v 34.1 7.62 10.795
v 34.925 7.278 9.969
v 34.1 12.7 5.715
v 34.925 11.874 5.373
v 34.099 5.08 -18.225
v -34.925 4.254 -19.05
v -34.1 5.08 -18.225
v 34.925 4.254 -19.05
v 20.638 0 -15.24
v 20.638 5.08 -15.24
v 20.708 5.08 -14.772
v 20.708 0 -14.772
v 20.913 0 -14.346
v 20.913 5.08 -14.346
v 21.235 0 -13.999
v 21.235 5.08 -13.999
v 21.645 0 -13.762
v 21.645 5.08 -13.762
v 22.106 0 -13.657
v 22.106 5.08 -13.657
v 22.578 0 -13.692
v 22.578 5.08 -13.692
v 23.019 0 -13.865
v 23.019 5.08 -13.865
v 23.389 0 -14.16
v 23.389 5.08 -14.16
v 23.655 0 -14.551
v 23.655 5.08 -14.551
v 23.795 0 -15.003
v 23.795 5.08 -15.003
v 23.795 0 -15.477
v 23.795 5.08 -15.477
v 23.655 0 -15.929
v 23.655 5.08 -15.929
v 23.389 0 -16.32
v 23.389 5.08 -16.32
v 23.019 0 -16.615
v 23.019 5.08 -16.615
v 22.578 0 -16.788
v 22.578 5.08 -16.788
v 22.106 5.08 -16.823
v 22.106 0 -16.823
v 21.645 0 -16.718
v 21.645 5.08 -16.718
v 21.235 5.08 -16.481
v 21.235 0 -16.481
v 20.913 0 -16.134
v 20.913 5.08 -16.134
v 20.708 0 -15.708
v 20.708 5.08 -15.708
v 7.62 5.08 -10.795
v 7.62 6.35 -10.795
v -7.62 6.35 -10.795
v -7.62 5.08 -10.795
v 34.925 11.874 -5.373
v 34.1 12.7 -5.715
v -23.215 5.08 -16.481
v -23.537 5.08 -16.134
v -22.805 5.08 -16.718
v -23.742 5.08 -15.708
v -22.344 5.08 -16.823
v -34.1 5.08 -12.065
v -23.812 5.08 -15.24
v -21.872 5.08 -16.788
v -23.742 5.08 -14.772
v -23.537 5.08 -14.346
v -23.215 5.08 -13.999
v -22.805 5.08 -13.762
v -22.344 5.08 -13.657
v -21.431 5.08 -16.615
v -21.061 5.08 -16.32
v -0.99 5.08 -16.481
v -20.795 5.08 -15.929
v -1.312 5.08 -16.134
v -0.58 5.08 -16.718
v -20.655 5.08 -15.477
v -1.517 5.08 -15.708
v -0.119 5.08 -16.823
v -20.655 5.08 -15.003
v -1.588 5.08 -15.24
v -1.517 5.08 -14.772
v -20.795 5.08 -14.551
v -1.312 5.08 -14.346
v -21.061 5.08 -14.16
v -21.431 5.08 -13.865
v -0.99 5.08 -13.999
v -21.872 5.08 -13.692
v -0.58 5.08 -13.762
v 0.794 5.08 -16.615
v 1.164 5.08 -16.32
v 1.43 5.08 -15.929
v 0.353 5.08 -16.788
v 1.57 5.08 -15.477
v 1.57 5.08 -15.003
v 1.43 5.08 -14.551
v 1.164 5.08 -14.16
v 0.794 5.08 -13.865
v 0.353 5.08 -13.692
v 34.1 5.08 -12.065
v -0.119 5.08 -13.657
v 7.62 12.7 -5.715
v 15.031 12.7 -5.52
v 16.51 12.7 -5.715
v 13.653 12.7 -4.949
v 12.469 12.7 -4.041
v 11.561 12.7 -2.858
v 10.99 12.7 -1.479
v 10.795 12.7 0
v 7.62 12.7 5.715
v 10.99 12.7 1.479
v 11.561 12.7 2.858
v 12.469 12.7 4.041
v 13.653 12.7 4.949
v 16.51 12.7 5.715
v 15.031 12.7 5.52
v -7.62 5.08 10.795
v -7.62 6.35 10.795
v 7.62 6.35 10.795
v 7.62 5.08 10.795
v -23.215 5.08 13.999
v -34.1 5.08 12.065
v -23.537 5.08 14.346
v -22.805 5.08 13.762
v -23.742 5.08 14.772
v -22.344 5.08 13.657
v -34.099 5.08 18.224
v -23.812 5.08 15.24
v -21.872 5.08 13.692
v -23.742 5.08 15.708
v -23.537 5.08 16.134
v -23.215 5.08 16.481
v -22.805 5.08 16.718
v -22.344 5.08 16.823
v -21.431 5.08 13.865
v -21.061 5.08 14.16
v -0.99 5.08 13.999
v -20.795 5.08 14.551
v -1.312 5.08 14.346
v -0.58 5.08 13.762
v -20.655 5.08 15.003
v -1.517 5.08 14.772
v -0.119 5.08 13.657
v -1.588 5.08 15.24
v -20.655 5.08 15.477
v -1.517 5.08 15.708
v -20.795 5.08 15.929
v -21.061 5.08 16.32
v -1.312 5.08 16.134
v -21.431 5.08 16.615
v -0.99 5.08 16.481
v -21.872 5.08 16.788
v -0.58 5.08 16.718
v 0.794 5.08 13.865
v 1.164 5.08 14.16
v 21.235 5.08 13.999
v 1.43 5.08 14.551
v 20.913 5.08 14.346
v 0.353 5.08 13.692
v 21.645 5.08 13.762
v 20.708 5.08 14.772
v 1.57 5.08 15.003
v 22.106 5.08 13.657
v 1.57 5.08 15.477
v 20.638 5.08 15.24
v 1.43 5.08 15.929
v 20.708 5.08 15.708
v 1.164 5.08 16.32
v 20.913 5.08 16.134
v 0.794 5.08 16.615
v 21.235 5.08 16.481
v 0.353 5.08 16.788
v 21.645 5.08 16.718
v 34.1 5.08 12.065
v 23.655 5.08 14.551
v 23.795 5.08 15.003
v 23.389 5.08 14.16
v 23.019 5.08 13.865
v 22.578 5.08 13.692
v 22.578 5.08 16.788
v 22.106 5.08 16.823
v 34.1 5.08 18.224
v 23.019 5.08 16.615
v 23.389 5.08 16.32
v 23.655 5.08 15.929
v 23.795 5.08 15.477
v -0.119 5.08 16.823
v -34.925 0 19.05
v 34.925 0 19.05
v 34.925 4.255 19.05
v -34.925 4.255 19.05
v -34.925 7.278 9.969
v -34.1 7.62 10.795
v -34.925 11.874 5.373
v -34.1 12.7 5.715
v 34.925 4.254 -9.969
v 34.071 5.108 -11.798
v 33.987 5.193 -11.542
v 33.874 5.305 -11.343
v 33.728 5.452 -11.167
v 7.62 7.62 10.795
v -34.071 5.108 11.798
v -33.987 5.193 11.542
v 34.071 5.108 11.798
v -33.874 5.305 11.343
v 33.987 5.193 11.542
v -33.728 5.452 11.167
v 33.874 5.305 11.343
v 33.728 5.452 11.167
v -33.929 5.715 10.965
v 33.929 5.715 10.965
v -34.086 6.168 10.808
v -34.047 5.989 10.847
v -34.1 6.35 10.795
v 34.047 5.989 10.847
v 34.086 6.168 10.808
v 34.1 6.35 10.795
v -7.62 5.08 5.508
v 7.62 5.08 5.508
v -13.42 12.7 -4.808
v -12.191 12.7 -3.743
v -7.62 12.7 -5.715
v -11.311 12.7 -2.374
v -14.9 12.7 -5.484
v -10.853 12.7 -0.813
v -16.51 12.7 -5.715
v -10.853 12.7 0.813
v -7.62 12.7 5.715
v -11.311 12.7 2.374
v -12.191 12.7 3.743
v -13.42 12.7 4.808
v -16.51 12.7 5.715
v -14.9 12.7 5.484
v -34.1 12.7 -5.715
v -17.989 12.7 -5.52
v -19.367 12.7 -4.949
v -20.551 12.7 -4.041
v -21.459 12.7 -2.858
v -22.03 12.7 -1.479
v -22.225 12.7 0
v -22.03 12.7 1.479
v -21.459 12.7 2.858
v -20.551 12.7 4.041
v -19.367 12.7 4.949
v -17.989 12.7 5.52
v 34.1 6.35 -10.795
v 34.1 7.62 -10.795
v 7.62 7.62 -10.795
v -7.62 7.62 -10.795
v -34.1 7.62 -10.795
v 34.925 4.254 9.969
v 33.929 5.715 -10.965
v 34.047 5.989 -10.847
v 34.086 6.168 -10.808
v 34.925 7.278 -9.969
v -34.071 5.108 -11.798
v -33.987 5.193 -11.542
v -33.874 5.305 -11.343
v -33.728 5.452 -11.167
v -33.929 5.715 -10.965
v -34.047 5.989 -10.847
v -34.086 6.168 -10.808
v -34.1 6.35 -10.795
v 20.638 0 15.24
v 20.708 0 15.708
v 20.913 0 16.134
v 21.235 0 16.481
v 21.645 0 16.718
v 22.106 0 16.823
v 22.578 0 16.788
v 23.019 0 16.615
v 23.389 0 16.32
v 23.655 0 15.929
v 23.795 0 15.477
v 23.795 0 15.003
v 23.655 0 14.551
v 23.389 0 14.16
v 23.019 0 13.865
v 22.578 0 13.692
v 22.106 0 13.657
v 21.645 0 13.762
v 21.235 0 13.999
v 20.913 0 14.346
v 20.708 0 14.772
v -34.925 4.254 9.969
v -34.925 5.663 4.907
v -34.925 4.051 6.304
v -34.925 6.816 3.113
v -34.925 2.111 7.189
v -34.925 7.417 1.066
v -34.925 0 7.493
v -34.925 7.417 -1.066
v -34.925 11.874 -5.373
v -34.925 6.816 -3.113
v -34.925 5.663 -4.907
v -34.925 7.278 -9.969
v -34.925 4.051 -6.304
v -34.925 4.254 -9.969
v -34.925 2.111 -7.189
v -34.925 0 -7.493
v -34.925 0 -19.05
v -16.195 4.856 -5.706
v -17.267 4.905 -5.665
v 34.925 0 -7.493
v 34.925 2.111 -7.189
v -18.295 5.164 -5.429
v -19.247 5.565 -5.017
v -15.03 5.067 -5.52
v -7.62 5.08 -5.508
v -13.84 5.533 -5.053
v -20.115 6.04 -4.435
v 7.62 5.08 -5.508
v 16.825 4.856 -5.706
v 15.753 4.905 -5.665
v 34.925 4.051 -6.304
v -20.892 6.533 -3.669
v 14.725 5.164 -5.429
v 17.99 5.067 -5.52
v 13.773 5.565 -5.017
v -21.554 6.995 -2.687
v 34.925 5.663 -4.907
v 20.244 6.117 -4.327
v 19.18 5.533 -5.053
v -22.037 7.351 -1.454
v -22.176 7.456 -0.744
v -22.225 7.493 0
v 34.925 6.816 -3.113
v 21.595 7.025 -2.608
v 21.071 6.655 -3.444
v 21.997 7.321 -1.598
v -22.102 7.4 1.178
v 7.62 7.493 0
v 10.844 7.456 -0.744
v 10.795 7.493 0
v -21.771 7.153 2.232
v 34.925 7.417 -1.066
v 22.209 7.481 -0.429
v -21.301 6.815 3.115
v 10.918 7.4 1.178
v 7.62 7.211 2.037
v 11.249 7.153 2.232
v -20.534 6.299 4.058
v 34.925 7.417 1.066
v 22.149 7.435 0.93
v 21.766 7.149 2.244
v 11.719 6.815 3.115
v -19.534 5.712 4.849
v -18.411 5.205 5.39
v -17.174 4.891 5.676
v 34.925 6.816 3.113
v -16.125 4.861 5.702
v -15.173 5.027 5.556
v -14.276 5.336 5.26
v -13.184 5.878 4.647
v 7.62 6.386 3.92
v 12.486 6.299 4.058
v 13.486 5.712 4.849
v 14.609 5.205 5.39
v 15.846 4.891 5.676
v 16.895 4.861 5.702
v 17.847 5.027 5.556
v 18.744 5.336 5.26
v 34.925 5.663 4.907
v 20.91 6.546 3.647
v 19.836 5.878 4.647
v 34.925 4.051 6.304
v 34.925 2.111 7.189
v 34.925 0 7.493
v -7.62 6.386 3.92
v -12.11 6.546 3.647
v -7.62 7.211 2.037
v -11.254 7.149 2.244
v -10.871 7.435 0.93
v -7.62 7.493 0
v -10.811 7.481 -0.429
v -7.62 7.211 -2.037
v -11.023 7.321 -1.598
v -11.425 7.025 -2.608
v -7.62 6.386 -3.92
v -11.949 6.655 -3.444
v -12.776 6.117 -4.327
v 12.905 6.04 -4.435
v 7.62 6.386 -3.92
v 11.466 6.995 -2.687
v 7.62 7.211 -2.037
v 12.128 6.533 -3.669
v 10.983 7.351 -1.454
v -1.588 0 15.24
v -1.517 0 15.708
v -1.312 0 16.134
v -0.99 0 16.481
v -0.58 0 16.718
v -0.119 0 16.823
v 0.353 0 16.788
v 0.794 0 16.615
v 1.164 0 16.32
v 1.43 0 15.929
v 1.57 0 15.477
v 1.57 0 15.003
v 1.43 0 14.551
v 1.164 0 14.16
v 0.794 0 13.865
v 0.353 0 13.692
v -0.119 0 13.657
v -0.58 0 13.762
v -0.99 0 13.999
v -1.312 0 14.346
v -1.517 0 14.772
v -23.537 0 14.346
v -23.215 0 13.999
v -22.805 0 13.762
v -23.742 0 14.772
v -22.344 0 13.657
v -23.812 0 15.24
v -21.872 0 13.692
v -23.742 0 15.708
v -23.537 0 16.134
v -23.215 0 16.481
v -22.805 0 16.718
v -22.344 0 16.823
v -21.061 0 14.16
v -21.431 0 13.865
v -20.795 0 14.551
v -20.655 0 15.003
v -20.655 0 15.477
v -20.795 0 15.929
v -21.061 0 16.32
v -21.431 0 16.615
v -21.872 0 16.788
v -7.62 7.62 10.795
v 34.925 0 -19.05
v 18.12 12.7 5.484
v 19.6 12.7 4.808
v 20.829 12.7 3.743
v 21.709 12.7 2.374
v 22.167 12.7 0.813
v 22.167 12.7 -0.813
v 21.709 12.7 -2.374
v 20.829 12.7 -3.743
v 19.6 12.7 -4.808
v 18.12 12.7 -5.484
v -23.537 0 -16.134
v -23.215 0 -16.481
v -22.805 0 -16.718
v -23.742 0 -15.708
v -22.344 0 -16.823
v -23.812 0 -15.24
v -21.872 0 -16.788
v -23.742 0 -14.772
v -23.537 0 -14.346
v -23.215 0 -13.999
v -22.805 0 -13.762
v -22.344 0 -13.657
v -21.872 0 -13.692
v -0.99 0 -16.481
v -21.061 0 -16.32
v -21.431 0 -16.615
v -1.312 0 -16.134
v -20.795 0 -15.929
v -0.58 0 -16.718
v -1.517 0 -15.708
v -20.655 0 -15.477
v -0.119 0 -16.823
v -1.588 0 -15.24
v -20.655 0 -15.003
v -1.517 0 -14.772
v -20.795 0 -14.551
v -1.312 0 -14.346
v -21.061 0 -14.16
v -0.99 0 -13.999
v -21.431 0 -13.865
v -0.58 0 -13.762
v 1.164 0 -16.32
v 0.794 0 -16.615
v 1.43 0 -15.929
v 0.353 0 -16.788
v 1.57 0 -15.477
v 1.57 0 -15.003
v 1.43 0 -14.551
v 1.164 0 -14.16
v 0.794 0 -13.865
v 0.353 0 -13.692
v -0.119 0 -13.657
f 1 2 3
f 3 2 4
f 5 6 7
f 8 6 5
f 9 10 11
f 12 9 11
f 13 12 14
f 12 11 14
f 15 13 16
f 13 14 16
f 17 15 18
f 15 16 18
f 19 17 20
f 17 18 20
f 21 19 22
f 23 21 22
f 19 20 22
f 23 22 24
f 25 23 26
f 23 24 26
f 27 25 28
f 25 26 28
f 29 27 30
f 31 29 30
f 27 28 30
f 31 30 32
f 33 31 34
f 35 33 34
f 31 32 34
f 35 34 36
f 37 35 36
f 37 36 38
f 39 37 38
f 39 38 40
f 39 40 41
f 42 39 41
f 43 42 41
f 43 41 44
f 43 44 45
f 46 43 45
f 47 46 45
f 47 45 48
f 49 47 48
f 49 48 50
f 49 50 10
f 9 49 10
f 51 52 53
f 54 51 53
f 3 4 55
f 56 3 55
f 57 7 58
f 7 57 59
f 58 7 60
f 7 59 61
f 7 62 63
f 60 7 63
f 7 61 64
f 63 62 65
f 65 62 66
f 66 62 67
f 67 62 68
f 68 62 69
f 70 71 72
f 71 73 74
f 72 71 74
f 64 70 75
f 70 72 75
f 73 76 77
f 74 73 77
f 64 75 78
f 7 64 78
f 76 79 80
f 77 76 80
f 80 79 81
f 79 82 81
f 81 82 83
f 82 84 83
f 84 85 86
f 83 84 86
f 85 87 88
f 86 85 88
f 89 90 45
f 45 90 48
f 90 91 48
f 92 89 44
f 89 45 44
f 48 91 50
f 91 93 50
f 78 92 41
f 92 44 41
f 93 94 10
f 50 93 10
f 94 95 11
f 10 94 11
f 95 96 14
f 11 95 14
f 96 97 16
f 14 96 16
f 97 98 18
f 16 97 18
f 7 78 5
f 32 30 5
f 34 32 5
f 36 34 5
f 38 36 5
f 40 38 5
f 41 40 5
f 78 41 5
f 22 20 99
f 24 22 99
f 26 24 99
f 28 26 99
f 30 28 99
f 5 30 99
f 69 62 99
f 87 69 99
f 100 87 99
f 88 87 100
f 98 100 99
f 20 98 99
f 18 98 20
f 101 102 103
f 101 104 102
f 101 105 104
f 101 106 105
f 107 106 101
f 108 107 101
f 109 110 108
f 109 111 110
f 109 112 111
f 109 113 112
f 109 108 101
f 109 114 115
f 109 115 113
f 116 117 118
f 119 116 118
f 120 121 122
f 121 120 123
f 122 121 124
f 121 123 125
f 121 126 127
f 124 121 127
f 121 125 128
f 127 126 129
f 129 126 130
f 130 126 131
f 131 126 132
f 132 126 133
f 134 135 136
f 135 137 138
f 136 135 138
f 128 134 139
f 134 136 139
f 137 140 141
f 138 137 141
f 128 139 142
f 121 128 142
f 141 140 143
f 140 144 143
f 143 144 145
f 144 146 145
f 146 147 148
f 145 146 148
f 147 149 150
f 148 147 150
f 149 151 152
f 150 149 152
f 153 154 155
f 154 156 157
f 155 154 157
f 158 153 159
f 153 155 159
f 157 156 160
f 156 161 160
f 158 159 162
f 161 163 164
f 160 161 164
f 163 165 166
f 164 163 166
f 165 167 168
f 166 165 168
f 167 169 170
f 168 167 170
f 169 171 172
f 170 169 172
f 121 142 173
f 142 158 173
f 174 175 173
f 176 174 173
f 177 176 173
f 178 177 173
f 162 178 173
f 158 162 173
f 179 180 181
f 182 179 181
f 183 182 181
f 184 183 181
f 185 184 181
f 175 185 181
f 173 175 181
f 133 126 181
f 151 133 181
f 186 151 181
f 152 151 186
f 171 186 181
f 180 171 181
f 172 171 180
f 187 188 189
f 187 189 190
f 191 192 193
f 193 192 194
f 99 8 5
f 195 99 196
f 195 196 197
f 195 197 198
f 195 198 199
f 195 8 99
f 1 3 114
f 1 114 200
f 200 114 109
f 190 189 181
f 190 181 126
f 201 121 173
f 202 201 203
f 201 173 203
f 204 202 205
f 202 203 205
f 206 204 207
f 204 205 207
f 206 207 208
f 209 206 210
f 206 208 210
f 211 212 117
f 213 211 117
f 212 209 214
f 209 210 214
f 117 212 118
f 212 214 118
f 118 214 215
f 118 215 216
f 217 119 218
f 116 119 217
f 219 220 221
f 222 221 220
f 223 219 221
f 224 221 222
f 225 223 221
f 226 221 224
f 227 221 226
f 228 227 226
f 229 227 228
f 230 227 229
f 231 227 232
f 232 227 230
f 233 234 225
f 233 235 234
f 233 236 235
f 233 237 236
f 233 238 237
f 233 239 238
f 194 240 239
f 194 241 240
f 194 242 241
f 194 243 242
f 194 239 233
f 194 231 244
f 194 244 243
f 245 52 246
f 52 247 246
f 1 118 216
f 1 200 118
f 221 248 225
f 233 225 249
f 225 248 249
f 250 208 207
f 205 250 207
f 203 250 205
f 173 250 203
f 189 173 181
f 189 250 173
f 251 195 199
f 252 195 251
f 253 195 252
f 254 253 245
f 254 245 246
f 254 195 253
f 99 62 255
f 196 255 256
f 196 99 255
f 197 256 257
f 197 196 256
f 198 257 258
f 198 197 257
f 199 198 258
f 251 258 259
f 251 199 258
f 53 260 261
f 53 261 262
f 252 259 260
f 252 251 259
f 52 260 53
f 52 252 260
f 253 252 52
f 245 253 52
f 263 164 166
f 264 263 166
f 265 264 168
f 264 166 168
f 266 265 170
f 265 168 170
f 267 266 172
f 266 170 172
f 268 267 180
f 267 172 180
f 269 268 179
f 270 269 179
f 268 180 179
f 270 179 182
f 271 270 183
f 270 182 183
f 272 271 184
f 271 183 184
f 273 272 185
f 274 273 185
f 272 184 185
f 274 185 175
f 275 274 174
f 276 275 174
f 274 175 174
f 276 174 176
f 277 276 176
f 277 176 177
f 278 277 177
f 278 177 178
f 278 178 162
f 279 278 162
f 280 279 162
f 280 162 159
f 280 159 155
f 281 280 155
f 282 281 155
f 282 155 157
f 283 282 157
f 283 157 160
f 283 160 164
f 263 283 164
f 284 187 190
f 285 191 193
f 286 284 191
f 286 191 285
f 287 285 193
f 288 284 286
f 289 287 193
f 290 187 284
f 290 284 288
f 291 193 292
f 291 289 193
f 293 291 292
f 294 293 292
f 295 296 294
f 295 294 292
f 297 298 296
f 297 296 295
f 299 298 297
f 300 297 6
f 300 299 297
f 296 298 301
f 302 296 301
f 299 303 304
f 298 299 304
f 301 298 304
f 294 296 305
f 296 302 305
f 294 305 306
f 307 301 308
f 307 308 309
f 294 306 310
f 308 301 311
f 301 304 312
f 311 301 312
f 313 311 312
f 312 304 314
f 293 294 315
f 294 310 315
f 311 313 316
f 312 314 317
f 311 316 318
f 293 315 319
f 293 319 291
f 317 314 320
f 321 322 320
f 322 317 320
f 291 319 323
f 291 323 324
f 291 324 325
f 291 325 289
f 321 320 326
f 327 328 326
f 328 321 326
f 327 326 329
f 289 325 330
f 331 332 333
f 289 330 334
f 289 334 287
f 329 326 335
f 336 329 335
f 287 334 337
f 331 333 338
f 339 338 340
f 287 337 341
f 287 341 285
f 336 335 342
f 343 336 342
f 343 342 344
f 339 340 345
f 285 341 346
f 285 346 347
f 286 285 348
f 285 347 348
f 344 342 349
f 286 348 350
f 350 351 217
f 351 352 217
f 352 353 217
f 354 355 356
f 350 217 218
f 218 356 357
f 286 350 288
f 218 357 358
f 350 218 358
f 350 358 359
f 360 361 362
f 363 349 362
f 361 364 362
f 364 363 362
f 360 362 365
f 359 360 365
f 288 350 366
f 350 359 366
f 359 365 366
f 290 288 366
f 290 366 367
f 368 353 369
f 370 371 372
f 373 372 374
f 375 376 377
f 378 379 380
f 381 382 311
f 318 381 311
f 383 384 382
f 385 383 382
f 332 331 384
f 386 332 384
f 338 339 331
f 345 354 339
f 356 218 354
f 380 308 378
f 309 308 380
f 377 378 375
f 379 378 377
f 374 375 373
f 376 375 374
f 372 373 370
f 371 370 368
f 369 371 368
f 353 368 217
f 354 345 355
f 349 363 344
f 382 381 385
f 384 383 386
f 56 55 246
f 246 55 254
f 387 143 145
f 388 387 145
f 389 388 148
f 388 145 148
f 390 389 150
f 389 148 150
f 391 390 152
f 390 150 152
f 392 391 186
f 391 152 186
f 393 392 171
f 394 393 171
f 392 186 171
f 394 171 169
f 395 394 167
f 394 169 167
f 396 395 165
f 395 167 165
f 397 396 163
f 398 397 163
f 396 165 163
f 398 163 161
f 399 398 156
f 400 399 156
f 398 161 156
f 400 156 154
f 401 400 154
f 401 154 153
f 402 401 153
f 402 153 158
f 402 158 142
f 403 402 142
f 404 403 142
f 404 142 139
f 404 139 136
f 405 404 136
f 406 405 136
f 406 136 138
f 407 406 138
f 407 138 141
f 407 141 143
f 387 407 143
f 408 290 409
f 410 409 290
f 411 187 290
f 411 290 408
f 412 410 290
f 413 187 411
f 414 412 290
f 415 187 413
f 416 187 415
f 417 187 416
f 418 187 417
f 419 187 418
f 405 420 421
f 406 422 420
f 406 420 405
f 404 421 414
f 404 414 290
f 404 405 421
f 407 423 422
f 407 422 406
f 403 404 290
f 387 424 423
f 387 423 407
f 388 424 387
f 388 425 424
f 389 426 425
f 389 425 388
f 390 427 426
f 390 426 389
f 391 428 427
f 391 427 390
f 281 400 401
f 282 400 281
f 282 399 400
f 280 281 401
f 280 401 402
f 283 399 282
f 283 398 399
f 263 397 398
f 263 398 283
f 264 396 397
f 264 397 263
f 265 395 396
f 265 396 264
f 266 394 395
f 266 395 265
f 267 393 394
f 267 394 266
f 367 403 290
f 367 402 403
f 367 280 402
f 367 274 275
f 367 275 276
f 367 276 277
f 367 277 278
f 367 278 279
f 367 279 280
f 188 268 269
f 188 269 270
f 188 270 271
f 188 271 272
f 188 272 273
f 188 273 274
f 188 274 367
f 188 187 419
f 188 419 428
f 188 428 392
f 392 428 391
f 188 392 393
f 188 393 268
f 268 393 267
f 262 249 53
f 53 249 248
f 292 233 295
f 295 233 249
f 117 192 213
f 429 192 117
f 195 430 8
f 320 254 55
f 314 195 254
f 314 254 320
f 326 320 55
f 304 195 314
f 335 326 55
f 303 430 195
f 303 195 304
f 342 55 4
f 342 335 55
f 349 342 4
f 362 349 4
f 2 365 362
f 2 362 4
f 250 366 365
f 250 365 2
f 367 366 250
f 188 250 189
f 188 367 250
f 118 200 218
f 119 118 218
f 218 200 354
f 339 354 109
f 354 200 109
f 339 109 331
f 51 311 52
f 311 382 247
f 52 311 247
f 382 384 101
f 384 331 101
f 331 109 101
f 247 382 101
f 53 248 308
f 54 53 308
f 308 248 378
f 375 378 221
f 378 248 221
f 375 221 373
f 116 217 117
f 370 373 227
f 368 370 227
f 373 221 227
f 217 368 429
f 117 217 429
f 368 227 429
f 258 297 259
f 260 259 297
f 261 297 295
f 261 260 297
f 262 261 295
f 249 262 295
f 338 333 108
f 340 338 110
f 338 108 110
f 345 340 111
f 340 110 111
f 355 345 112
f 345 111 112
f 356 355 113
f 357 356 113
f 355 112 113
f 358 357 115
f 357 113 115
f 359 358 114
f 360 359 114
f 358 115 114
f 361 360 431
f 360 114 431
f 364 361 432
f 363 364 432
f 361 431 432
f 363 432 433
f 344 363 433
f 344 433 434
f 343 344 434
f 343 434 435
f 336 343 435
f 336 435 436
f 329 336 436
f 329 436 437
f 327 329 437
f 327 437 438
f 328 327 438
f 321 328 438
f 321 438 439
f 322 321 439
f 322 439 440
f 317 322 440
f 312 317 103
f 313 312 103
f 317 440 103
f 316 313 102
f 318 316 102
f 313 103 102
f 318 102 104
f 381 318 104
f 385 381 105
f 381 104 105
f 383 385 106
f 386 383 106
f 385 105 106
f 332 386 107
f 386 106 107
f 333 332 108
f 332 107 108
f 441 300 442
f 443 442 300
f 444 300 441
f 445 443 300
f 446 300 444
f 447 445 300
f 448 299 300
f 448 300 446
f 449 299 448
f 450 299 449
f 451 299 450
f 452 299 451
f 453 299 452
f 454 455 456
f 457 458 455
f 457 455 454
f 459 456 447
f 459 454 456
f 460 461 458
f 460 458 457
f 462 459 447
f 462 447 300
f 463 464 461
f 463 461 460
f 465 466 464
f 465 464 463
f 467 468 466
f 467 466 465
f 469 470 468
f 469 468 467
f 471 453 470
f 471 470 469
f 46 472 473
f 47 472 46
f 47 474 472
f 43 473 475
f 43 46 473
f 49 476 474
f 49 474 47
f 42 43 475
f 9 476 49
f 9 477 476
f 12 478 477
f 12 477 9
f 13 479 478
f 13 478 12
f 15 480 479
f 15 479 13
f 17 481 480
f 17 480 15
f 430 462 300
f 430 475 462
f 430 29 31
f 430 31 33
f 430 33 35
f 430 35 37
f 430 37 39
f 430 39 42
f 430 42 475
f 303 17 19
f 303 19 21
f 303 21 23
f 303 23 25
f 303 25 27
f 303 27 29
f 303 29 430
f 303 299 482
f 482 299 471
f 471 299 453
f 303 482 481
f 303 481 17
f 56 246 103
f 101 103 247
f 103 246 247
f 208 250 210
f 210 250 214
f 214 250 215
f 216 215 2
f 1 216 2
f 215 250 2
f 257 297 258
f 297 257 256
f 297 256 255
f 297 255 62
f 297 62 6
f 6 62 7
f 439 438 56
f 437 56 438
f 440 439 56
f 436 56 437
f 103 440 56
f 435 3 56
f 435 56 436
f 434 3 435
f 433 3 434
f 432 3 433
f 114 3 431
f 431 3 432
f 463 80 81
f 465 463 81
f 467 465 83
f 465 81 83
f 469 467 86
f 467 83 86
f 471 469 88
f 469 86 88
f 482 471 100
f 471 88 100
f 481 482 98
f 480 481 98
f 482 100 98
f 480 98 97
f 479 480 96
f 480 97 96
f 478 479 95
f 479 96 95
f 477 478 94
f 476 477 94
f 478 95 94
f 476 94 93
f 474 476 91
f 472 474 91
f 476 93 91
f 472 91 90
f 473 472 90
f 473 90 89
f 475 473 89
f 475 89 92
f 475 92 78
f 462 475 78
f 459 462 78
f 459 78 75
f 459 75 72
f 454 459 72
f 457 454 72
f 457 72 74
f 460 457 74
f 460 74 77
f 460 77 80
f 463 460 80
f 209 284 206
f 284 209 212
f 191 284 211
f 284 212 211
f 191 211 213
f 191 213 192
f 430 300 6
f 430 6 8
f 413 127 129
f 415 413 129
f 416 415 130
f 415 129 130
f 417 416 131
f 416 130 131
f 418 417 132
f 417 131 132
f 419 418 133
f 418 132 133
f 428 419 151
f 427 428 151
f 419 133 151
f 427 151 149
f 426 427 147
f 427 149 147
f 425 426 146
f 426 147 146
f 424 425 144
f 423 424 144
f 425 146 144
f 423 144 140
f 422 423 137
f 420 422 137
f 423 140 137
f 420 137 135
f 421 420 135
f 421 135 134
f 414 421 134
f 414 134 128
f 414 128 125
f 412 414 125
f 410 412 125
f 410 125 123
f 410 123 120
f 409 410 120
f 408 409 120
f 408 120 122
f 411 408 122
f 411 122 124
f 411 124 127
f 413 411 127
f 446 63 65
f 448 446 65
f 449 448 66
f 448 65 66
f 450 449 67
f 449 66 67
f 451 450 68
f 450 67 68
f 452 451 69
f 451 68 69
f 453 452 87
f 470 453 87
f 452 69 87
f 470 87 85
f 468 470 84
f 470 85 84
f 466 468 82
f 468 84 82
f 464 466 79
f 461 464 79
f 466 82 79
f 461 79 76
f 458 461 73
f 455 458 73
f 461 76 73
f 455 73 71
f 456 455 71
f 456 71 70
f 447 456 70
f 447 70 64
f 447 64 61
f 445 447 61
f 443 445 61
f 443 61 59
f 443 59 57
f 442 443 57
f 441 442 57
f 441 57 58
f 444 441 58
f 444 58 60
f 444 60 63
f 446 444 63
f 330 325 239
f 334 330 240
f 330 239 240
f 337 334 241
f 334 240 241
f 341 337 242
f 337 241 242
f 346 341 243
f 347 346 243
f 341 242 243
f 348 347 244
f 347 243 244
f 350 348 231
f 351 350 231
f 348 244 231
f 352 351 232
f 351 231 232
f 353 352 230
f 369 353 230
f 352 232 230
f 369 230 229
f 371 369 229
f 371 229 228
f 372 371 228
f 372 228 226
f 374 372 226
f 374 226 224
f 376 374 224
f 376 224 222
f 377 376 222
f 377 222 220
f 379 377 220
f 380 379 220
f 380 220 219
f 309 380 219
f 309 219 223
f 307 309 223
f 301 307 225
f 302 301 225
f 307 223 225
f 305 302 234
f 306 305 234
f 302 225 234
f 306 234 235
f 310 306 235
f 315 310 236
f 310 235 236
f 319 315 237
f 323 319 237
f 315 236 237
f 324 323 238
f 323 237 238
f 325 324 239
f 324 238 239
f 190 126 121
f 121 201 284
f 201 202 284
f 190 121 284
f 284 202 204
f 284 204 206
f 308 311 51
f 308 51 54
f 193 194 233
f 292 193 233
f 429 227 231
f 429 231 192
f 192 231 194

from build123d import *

# Parameters (mm, degrees)
F0_W      = 34.925
F0_H      = 12.7
F1_DEPTH  = 10.795
F2_DEPTH  = 10.795
F3_W      = 34.925
F3_H      = 19.05
F4_DEPTH  = 5.08
F5_R      = 7.493
F6_DEPTH  = 101.6
F7_R      = 1.5875
F8_DEPTH  = 25.4
F9_SIZE   = 5.08
F10_SIZE  = 0.8255
F11_R     = 1.27
F12_R     = 5.715
F13_DEPTH = 25.4
F14_W     = 7.62
F14_H     = 5.08
F15_DEPTH = 7.62


with BuildPart() as f1:
    # F0 (on Top) → F1 (new body)
    with BuildSketch(Plane.XY):
        with Locations((-17.4625, 6.35)):
            Rectangle(F0_W, F0_H)
        with Locations((17.4625, 6.35)):
            Rectangle(F0_W, F0_H)
    extrude(amount=F1_DEPTH)

    # F0 (on Top) → F2 (join)
    with BuildSketch(Plane.XY):
        with Locations((-17.4625, 6.35)):
            Rectangle(F0_W, F0_H)
        with Locations((17.4625, 6.35)):
            Rectangle(F0_W, F0_H)
    extrude(amount=-F2_DEPTH)

    # F3 (on Front) → F4 (join)
    with BuildSketch(Plane.XZ):
        with Locations((-17.4625, 9.525)):
            Rectangle(F3_W, F3_H)
        with Locations((-17.4625, -9.525)):
            Rectangle(F3_W, F3_H)
        Polygon((0, 19.05), (0, 0), (0, -19.05), (34.925, -19.05), (34.925, 0), (34.925, 19.05), align=None)
    extrude(amount=-F4_DEPTH)

    # F5 (on face) → F6 (cut)
    with BuildSketch(Plane.YZ.offset(34.925)):
        Circle(F5_R)
    extrude(amount=-F6_DEPTH, mode=Mode.SUBTRACT)

    # F7 (on face) → F8 (cut)
    with BuildSketch(Plane(origin=(0, 12.7, 0), x_dir=(-1, 0, 0), z_dir=(0, 1, 0))):
        with Locations((-22.225, -15.24)):
            Circle(F7_R)
        with Locations((-22.225, 15.24)):
            Circle(F7_R)
        with Locations((0, -15.24)):
            Circle(F7_R)
        with Locations((22.225, 15.24)):
            Circle(F7_R)
        with Locations((22.225, -15.24)):
            Circle(F7_R)
        with Locations((0, 15.24)):
            Circle(F7_R)
    extrude(amount=-F8_DEPTH, mode=Mode.SUBTRACT)

    # F9
    f9_edges = [f1.edges().sort_by_distance(p)[0] for p in [
        (0, 12.7, -10.795),
        (0, 12.7, 10.795),
    ]]
    chamfer(f9_edges, length=F9_SIZE)

    # F10
    f10_edges = [f1.edges().sort_by_distance(p)[0] for p in [
        (0, 5.08, -19.05),
        (-34.925, 5.08, -14.9225),
        (-34.925, 10.16, 8.255),
        (-34.925, 12.7, 0),
        (-34.925, 10.16, -8.255),
        (34.925, 10.16, 8.255),
        (34.925, 12.7, 0),
        (34.925, 10.16, -8.255),
        (34.925, 6.35, -10.795),
        (34.925, 5.08, -14.9225),
        (0, 5.08, 19.05),
        (-34.925, 5.08, 14.9225),
        (-34.925, 6.35, 10.795),
        (34.925, 5.08, 14.9225),
        (34.925, 6.35, 10.795),
        (-34.925, 6.35, -10.795),
    ]]
    chamfer(f10_edges, length=F10_SIZE)

    # F11
    f11_edges = [f1.edges().sort_by_distance(p)[0] for p in [
        (0, 5.08, -10.795),
        (0, 5.08, 10.795),
    ]]
    fillet(f11_edges, radius=F11_R)

    # F12 (on face) → F13 (cut)
    with BuildSketch(Plane(origin=(0, 12.7, 0), x_dir=(-1, 0, 0), z_dir=(0, 1, 0))):
        with Locations((-16.51, 0)):
            Circle(F12_R)
        with Locations((16.51, 0)):
            Circle(F12_R)
    extrude(amount=-F13_DEPTH, mode=Mode.SUBTRACT)

    # F14 (on face) → F15 (cut)
    with BuildSketch(Plane(origin=(0, 12.7, 0), x_dir=(-1, 0, 0), z_dir=(0, 1, 0))):
        Polygon((0, -5.715), (0, 0), (0, 5.715), (-7.62, 5.715), (-7.62, -5.715), align=None)
        Polygon((0, 5.715), (0, 0), (0, -5.715), (7.62, -5.715), (7.62, 5.715), align=None)
        with Locations((3.81, 8.255)):
            Rectangle(F14_W, F14_H)
        with Locations((-3.81, 8.255)):
            Rectangle(F14_W, F14_H)
        with Locations((-3.81, -8.255)):
            Rectangle(F14_W, F14_H)
        with Locations((3.81, -8.255)):
            Rectangle(F14_W, F14_H)
    extrude(amount=-F15_DEPTH, mode=Mode.SUBTRACT)


solid = f1.part
